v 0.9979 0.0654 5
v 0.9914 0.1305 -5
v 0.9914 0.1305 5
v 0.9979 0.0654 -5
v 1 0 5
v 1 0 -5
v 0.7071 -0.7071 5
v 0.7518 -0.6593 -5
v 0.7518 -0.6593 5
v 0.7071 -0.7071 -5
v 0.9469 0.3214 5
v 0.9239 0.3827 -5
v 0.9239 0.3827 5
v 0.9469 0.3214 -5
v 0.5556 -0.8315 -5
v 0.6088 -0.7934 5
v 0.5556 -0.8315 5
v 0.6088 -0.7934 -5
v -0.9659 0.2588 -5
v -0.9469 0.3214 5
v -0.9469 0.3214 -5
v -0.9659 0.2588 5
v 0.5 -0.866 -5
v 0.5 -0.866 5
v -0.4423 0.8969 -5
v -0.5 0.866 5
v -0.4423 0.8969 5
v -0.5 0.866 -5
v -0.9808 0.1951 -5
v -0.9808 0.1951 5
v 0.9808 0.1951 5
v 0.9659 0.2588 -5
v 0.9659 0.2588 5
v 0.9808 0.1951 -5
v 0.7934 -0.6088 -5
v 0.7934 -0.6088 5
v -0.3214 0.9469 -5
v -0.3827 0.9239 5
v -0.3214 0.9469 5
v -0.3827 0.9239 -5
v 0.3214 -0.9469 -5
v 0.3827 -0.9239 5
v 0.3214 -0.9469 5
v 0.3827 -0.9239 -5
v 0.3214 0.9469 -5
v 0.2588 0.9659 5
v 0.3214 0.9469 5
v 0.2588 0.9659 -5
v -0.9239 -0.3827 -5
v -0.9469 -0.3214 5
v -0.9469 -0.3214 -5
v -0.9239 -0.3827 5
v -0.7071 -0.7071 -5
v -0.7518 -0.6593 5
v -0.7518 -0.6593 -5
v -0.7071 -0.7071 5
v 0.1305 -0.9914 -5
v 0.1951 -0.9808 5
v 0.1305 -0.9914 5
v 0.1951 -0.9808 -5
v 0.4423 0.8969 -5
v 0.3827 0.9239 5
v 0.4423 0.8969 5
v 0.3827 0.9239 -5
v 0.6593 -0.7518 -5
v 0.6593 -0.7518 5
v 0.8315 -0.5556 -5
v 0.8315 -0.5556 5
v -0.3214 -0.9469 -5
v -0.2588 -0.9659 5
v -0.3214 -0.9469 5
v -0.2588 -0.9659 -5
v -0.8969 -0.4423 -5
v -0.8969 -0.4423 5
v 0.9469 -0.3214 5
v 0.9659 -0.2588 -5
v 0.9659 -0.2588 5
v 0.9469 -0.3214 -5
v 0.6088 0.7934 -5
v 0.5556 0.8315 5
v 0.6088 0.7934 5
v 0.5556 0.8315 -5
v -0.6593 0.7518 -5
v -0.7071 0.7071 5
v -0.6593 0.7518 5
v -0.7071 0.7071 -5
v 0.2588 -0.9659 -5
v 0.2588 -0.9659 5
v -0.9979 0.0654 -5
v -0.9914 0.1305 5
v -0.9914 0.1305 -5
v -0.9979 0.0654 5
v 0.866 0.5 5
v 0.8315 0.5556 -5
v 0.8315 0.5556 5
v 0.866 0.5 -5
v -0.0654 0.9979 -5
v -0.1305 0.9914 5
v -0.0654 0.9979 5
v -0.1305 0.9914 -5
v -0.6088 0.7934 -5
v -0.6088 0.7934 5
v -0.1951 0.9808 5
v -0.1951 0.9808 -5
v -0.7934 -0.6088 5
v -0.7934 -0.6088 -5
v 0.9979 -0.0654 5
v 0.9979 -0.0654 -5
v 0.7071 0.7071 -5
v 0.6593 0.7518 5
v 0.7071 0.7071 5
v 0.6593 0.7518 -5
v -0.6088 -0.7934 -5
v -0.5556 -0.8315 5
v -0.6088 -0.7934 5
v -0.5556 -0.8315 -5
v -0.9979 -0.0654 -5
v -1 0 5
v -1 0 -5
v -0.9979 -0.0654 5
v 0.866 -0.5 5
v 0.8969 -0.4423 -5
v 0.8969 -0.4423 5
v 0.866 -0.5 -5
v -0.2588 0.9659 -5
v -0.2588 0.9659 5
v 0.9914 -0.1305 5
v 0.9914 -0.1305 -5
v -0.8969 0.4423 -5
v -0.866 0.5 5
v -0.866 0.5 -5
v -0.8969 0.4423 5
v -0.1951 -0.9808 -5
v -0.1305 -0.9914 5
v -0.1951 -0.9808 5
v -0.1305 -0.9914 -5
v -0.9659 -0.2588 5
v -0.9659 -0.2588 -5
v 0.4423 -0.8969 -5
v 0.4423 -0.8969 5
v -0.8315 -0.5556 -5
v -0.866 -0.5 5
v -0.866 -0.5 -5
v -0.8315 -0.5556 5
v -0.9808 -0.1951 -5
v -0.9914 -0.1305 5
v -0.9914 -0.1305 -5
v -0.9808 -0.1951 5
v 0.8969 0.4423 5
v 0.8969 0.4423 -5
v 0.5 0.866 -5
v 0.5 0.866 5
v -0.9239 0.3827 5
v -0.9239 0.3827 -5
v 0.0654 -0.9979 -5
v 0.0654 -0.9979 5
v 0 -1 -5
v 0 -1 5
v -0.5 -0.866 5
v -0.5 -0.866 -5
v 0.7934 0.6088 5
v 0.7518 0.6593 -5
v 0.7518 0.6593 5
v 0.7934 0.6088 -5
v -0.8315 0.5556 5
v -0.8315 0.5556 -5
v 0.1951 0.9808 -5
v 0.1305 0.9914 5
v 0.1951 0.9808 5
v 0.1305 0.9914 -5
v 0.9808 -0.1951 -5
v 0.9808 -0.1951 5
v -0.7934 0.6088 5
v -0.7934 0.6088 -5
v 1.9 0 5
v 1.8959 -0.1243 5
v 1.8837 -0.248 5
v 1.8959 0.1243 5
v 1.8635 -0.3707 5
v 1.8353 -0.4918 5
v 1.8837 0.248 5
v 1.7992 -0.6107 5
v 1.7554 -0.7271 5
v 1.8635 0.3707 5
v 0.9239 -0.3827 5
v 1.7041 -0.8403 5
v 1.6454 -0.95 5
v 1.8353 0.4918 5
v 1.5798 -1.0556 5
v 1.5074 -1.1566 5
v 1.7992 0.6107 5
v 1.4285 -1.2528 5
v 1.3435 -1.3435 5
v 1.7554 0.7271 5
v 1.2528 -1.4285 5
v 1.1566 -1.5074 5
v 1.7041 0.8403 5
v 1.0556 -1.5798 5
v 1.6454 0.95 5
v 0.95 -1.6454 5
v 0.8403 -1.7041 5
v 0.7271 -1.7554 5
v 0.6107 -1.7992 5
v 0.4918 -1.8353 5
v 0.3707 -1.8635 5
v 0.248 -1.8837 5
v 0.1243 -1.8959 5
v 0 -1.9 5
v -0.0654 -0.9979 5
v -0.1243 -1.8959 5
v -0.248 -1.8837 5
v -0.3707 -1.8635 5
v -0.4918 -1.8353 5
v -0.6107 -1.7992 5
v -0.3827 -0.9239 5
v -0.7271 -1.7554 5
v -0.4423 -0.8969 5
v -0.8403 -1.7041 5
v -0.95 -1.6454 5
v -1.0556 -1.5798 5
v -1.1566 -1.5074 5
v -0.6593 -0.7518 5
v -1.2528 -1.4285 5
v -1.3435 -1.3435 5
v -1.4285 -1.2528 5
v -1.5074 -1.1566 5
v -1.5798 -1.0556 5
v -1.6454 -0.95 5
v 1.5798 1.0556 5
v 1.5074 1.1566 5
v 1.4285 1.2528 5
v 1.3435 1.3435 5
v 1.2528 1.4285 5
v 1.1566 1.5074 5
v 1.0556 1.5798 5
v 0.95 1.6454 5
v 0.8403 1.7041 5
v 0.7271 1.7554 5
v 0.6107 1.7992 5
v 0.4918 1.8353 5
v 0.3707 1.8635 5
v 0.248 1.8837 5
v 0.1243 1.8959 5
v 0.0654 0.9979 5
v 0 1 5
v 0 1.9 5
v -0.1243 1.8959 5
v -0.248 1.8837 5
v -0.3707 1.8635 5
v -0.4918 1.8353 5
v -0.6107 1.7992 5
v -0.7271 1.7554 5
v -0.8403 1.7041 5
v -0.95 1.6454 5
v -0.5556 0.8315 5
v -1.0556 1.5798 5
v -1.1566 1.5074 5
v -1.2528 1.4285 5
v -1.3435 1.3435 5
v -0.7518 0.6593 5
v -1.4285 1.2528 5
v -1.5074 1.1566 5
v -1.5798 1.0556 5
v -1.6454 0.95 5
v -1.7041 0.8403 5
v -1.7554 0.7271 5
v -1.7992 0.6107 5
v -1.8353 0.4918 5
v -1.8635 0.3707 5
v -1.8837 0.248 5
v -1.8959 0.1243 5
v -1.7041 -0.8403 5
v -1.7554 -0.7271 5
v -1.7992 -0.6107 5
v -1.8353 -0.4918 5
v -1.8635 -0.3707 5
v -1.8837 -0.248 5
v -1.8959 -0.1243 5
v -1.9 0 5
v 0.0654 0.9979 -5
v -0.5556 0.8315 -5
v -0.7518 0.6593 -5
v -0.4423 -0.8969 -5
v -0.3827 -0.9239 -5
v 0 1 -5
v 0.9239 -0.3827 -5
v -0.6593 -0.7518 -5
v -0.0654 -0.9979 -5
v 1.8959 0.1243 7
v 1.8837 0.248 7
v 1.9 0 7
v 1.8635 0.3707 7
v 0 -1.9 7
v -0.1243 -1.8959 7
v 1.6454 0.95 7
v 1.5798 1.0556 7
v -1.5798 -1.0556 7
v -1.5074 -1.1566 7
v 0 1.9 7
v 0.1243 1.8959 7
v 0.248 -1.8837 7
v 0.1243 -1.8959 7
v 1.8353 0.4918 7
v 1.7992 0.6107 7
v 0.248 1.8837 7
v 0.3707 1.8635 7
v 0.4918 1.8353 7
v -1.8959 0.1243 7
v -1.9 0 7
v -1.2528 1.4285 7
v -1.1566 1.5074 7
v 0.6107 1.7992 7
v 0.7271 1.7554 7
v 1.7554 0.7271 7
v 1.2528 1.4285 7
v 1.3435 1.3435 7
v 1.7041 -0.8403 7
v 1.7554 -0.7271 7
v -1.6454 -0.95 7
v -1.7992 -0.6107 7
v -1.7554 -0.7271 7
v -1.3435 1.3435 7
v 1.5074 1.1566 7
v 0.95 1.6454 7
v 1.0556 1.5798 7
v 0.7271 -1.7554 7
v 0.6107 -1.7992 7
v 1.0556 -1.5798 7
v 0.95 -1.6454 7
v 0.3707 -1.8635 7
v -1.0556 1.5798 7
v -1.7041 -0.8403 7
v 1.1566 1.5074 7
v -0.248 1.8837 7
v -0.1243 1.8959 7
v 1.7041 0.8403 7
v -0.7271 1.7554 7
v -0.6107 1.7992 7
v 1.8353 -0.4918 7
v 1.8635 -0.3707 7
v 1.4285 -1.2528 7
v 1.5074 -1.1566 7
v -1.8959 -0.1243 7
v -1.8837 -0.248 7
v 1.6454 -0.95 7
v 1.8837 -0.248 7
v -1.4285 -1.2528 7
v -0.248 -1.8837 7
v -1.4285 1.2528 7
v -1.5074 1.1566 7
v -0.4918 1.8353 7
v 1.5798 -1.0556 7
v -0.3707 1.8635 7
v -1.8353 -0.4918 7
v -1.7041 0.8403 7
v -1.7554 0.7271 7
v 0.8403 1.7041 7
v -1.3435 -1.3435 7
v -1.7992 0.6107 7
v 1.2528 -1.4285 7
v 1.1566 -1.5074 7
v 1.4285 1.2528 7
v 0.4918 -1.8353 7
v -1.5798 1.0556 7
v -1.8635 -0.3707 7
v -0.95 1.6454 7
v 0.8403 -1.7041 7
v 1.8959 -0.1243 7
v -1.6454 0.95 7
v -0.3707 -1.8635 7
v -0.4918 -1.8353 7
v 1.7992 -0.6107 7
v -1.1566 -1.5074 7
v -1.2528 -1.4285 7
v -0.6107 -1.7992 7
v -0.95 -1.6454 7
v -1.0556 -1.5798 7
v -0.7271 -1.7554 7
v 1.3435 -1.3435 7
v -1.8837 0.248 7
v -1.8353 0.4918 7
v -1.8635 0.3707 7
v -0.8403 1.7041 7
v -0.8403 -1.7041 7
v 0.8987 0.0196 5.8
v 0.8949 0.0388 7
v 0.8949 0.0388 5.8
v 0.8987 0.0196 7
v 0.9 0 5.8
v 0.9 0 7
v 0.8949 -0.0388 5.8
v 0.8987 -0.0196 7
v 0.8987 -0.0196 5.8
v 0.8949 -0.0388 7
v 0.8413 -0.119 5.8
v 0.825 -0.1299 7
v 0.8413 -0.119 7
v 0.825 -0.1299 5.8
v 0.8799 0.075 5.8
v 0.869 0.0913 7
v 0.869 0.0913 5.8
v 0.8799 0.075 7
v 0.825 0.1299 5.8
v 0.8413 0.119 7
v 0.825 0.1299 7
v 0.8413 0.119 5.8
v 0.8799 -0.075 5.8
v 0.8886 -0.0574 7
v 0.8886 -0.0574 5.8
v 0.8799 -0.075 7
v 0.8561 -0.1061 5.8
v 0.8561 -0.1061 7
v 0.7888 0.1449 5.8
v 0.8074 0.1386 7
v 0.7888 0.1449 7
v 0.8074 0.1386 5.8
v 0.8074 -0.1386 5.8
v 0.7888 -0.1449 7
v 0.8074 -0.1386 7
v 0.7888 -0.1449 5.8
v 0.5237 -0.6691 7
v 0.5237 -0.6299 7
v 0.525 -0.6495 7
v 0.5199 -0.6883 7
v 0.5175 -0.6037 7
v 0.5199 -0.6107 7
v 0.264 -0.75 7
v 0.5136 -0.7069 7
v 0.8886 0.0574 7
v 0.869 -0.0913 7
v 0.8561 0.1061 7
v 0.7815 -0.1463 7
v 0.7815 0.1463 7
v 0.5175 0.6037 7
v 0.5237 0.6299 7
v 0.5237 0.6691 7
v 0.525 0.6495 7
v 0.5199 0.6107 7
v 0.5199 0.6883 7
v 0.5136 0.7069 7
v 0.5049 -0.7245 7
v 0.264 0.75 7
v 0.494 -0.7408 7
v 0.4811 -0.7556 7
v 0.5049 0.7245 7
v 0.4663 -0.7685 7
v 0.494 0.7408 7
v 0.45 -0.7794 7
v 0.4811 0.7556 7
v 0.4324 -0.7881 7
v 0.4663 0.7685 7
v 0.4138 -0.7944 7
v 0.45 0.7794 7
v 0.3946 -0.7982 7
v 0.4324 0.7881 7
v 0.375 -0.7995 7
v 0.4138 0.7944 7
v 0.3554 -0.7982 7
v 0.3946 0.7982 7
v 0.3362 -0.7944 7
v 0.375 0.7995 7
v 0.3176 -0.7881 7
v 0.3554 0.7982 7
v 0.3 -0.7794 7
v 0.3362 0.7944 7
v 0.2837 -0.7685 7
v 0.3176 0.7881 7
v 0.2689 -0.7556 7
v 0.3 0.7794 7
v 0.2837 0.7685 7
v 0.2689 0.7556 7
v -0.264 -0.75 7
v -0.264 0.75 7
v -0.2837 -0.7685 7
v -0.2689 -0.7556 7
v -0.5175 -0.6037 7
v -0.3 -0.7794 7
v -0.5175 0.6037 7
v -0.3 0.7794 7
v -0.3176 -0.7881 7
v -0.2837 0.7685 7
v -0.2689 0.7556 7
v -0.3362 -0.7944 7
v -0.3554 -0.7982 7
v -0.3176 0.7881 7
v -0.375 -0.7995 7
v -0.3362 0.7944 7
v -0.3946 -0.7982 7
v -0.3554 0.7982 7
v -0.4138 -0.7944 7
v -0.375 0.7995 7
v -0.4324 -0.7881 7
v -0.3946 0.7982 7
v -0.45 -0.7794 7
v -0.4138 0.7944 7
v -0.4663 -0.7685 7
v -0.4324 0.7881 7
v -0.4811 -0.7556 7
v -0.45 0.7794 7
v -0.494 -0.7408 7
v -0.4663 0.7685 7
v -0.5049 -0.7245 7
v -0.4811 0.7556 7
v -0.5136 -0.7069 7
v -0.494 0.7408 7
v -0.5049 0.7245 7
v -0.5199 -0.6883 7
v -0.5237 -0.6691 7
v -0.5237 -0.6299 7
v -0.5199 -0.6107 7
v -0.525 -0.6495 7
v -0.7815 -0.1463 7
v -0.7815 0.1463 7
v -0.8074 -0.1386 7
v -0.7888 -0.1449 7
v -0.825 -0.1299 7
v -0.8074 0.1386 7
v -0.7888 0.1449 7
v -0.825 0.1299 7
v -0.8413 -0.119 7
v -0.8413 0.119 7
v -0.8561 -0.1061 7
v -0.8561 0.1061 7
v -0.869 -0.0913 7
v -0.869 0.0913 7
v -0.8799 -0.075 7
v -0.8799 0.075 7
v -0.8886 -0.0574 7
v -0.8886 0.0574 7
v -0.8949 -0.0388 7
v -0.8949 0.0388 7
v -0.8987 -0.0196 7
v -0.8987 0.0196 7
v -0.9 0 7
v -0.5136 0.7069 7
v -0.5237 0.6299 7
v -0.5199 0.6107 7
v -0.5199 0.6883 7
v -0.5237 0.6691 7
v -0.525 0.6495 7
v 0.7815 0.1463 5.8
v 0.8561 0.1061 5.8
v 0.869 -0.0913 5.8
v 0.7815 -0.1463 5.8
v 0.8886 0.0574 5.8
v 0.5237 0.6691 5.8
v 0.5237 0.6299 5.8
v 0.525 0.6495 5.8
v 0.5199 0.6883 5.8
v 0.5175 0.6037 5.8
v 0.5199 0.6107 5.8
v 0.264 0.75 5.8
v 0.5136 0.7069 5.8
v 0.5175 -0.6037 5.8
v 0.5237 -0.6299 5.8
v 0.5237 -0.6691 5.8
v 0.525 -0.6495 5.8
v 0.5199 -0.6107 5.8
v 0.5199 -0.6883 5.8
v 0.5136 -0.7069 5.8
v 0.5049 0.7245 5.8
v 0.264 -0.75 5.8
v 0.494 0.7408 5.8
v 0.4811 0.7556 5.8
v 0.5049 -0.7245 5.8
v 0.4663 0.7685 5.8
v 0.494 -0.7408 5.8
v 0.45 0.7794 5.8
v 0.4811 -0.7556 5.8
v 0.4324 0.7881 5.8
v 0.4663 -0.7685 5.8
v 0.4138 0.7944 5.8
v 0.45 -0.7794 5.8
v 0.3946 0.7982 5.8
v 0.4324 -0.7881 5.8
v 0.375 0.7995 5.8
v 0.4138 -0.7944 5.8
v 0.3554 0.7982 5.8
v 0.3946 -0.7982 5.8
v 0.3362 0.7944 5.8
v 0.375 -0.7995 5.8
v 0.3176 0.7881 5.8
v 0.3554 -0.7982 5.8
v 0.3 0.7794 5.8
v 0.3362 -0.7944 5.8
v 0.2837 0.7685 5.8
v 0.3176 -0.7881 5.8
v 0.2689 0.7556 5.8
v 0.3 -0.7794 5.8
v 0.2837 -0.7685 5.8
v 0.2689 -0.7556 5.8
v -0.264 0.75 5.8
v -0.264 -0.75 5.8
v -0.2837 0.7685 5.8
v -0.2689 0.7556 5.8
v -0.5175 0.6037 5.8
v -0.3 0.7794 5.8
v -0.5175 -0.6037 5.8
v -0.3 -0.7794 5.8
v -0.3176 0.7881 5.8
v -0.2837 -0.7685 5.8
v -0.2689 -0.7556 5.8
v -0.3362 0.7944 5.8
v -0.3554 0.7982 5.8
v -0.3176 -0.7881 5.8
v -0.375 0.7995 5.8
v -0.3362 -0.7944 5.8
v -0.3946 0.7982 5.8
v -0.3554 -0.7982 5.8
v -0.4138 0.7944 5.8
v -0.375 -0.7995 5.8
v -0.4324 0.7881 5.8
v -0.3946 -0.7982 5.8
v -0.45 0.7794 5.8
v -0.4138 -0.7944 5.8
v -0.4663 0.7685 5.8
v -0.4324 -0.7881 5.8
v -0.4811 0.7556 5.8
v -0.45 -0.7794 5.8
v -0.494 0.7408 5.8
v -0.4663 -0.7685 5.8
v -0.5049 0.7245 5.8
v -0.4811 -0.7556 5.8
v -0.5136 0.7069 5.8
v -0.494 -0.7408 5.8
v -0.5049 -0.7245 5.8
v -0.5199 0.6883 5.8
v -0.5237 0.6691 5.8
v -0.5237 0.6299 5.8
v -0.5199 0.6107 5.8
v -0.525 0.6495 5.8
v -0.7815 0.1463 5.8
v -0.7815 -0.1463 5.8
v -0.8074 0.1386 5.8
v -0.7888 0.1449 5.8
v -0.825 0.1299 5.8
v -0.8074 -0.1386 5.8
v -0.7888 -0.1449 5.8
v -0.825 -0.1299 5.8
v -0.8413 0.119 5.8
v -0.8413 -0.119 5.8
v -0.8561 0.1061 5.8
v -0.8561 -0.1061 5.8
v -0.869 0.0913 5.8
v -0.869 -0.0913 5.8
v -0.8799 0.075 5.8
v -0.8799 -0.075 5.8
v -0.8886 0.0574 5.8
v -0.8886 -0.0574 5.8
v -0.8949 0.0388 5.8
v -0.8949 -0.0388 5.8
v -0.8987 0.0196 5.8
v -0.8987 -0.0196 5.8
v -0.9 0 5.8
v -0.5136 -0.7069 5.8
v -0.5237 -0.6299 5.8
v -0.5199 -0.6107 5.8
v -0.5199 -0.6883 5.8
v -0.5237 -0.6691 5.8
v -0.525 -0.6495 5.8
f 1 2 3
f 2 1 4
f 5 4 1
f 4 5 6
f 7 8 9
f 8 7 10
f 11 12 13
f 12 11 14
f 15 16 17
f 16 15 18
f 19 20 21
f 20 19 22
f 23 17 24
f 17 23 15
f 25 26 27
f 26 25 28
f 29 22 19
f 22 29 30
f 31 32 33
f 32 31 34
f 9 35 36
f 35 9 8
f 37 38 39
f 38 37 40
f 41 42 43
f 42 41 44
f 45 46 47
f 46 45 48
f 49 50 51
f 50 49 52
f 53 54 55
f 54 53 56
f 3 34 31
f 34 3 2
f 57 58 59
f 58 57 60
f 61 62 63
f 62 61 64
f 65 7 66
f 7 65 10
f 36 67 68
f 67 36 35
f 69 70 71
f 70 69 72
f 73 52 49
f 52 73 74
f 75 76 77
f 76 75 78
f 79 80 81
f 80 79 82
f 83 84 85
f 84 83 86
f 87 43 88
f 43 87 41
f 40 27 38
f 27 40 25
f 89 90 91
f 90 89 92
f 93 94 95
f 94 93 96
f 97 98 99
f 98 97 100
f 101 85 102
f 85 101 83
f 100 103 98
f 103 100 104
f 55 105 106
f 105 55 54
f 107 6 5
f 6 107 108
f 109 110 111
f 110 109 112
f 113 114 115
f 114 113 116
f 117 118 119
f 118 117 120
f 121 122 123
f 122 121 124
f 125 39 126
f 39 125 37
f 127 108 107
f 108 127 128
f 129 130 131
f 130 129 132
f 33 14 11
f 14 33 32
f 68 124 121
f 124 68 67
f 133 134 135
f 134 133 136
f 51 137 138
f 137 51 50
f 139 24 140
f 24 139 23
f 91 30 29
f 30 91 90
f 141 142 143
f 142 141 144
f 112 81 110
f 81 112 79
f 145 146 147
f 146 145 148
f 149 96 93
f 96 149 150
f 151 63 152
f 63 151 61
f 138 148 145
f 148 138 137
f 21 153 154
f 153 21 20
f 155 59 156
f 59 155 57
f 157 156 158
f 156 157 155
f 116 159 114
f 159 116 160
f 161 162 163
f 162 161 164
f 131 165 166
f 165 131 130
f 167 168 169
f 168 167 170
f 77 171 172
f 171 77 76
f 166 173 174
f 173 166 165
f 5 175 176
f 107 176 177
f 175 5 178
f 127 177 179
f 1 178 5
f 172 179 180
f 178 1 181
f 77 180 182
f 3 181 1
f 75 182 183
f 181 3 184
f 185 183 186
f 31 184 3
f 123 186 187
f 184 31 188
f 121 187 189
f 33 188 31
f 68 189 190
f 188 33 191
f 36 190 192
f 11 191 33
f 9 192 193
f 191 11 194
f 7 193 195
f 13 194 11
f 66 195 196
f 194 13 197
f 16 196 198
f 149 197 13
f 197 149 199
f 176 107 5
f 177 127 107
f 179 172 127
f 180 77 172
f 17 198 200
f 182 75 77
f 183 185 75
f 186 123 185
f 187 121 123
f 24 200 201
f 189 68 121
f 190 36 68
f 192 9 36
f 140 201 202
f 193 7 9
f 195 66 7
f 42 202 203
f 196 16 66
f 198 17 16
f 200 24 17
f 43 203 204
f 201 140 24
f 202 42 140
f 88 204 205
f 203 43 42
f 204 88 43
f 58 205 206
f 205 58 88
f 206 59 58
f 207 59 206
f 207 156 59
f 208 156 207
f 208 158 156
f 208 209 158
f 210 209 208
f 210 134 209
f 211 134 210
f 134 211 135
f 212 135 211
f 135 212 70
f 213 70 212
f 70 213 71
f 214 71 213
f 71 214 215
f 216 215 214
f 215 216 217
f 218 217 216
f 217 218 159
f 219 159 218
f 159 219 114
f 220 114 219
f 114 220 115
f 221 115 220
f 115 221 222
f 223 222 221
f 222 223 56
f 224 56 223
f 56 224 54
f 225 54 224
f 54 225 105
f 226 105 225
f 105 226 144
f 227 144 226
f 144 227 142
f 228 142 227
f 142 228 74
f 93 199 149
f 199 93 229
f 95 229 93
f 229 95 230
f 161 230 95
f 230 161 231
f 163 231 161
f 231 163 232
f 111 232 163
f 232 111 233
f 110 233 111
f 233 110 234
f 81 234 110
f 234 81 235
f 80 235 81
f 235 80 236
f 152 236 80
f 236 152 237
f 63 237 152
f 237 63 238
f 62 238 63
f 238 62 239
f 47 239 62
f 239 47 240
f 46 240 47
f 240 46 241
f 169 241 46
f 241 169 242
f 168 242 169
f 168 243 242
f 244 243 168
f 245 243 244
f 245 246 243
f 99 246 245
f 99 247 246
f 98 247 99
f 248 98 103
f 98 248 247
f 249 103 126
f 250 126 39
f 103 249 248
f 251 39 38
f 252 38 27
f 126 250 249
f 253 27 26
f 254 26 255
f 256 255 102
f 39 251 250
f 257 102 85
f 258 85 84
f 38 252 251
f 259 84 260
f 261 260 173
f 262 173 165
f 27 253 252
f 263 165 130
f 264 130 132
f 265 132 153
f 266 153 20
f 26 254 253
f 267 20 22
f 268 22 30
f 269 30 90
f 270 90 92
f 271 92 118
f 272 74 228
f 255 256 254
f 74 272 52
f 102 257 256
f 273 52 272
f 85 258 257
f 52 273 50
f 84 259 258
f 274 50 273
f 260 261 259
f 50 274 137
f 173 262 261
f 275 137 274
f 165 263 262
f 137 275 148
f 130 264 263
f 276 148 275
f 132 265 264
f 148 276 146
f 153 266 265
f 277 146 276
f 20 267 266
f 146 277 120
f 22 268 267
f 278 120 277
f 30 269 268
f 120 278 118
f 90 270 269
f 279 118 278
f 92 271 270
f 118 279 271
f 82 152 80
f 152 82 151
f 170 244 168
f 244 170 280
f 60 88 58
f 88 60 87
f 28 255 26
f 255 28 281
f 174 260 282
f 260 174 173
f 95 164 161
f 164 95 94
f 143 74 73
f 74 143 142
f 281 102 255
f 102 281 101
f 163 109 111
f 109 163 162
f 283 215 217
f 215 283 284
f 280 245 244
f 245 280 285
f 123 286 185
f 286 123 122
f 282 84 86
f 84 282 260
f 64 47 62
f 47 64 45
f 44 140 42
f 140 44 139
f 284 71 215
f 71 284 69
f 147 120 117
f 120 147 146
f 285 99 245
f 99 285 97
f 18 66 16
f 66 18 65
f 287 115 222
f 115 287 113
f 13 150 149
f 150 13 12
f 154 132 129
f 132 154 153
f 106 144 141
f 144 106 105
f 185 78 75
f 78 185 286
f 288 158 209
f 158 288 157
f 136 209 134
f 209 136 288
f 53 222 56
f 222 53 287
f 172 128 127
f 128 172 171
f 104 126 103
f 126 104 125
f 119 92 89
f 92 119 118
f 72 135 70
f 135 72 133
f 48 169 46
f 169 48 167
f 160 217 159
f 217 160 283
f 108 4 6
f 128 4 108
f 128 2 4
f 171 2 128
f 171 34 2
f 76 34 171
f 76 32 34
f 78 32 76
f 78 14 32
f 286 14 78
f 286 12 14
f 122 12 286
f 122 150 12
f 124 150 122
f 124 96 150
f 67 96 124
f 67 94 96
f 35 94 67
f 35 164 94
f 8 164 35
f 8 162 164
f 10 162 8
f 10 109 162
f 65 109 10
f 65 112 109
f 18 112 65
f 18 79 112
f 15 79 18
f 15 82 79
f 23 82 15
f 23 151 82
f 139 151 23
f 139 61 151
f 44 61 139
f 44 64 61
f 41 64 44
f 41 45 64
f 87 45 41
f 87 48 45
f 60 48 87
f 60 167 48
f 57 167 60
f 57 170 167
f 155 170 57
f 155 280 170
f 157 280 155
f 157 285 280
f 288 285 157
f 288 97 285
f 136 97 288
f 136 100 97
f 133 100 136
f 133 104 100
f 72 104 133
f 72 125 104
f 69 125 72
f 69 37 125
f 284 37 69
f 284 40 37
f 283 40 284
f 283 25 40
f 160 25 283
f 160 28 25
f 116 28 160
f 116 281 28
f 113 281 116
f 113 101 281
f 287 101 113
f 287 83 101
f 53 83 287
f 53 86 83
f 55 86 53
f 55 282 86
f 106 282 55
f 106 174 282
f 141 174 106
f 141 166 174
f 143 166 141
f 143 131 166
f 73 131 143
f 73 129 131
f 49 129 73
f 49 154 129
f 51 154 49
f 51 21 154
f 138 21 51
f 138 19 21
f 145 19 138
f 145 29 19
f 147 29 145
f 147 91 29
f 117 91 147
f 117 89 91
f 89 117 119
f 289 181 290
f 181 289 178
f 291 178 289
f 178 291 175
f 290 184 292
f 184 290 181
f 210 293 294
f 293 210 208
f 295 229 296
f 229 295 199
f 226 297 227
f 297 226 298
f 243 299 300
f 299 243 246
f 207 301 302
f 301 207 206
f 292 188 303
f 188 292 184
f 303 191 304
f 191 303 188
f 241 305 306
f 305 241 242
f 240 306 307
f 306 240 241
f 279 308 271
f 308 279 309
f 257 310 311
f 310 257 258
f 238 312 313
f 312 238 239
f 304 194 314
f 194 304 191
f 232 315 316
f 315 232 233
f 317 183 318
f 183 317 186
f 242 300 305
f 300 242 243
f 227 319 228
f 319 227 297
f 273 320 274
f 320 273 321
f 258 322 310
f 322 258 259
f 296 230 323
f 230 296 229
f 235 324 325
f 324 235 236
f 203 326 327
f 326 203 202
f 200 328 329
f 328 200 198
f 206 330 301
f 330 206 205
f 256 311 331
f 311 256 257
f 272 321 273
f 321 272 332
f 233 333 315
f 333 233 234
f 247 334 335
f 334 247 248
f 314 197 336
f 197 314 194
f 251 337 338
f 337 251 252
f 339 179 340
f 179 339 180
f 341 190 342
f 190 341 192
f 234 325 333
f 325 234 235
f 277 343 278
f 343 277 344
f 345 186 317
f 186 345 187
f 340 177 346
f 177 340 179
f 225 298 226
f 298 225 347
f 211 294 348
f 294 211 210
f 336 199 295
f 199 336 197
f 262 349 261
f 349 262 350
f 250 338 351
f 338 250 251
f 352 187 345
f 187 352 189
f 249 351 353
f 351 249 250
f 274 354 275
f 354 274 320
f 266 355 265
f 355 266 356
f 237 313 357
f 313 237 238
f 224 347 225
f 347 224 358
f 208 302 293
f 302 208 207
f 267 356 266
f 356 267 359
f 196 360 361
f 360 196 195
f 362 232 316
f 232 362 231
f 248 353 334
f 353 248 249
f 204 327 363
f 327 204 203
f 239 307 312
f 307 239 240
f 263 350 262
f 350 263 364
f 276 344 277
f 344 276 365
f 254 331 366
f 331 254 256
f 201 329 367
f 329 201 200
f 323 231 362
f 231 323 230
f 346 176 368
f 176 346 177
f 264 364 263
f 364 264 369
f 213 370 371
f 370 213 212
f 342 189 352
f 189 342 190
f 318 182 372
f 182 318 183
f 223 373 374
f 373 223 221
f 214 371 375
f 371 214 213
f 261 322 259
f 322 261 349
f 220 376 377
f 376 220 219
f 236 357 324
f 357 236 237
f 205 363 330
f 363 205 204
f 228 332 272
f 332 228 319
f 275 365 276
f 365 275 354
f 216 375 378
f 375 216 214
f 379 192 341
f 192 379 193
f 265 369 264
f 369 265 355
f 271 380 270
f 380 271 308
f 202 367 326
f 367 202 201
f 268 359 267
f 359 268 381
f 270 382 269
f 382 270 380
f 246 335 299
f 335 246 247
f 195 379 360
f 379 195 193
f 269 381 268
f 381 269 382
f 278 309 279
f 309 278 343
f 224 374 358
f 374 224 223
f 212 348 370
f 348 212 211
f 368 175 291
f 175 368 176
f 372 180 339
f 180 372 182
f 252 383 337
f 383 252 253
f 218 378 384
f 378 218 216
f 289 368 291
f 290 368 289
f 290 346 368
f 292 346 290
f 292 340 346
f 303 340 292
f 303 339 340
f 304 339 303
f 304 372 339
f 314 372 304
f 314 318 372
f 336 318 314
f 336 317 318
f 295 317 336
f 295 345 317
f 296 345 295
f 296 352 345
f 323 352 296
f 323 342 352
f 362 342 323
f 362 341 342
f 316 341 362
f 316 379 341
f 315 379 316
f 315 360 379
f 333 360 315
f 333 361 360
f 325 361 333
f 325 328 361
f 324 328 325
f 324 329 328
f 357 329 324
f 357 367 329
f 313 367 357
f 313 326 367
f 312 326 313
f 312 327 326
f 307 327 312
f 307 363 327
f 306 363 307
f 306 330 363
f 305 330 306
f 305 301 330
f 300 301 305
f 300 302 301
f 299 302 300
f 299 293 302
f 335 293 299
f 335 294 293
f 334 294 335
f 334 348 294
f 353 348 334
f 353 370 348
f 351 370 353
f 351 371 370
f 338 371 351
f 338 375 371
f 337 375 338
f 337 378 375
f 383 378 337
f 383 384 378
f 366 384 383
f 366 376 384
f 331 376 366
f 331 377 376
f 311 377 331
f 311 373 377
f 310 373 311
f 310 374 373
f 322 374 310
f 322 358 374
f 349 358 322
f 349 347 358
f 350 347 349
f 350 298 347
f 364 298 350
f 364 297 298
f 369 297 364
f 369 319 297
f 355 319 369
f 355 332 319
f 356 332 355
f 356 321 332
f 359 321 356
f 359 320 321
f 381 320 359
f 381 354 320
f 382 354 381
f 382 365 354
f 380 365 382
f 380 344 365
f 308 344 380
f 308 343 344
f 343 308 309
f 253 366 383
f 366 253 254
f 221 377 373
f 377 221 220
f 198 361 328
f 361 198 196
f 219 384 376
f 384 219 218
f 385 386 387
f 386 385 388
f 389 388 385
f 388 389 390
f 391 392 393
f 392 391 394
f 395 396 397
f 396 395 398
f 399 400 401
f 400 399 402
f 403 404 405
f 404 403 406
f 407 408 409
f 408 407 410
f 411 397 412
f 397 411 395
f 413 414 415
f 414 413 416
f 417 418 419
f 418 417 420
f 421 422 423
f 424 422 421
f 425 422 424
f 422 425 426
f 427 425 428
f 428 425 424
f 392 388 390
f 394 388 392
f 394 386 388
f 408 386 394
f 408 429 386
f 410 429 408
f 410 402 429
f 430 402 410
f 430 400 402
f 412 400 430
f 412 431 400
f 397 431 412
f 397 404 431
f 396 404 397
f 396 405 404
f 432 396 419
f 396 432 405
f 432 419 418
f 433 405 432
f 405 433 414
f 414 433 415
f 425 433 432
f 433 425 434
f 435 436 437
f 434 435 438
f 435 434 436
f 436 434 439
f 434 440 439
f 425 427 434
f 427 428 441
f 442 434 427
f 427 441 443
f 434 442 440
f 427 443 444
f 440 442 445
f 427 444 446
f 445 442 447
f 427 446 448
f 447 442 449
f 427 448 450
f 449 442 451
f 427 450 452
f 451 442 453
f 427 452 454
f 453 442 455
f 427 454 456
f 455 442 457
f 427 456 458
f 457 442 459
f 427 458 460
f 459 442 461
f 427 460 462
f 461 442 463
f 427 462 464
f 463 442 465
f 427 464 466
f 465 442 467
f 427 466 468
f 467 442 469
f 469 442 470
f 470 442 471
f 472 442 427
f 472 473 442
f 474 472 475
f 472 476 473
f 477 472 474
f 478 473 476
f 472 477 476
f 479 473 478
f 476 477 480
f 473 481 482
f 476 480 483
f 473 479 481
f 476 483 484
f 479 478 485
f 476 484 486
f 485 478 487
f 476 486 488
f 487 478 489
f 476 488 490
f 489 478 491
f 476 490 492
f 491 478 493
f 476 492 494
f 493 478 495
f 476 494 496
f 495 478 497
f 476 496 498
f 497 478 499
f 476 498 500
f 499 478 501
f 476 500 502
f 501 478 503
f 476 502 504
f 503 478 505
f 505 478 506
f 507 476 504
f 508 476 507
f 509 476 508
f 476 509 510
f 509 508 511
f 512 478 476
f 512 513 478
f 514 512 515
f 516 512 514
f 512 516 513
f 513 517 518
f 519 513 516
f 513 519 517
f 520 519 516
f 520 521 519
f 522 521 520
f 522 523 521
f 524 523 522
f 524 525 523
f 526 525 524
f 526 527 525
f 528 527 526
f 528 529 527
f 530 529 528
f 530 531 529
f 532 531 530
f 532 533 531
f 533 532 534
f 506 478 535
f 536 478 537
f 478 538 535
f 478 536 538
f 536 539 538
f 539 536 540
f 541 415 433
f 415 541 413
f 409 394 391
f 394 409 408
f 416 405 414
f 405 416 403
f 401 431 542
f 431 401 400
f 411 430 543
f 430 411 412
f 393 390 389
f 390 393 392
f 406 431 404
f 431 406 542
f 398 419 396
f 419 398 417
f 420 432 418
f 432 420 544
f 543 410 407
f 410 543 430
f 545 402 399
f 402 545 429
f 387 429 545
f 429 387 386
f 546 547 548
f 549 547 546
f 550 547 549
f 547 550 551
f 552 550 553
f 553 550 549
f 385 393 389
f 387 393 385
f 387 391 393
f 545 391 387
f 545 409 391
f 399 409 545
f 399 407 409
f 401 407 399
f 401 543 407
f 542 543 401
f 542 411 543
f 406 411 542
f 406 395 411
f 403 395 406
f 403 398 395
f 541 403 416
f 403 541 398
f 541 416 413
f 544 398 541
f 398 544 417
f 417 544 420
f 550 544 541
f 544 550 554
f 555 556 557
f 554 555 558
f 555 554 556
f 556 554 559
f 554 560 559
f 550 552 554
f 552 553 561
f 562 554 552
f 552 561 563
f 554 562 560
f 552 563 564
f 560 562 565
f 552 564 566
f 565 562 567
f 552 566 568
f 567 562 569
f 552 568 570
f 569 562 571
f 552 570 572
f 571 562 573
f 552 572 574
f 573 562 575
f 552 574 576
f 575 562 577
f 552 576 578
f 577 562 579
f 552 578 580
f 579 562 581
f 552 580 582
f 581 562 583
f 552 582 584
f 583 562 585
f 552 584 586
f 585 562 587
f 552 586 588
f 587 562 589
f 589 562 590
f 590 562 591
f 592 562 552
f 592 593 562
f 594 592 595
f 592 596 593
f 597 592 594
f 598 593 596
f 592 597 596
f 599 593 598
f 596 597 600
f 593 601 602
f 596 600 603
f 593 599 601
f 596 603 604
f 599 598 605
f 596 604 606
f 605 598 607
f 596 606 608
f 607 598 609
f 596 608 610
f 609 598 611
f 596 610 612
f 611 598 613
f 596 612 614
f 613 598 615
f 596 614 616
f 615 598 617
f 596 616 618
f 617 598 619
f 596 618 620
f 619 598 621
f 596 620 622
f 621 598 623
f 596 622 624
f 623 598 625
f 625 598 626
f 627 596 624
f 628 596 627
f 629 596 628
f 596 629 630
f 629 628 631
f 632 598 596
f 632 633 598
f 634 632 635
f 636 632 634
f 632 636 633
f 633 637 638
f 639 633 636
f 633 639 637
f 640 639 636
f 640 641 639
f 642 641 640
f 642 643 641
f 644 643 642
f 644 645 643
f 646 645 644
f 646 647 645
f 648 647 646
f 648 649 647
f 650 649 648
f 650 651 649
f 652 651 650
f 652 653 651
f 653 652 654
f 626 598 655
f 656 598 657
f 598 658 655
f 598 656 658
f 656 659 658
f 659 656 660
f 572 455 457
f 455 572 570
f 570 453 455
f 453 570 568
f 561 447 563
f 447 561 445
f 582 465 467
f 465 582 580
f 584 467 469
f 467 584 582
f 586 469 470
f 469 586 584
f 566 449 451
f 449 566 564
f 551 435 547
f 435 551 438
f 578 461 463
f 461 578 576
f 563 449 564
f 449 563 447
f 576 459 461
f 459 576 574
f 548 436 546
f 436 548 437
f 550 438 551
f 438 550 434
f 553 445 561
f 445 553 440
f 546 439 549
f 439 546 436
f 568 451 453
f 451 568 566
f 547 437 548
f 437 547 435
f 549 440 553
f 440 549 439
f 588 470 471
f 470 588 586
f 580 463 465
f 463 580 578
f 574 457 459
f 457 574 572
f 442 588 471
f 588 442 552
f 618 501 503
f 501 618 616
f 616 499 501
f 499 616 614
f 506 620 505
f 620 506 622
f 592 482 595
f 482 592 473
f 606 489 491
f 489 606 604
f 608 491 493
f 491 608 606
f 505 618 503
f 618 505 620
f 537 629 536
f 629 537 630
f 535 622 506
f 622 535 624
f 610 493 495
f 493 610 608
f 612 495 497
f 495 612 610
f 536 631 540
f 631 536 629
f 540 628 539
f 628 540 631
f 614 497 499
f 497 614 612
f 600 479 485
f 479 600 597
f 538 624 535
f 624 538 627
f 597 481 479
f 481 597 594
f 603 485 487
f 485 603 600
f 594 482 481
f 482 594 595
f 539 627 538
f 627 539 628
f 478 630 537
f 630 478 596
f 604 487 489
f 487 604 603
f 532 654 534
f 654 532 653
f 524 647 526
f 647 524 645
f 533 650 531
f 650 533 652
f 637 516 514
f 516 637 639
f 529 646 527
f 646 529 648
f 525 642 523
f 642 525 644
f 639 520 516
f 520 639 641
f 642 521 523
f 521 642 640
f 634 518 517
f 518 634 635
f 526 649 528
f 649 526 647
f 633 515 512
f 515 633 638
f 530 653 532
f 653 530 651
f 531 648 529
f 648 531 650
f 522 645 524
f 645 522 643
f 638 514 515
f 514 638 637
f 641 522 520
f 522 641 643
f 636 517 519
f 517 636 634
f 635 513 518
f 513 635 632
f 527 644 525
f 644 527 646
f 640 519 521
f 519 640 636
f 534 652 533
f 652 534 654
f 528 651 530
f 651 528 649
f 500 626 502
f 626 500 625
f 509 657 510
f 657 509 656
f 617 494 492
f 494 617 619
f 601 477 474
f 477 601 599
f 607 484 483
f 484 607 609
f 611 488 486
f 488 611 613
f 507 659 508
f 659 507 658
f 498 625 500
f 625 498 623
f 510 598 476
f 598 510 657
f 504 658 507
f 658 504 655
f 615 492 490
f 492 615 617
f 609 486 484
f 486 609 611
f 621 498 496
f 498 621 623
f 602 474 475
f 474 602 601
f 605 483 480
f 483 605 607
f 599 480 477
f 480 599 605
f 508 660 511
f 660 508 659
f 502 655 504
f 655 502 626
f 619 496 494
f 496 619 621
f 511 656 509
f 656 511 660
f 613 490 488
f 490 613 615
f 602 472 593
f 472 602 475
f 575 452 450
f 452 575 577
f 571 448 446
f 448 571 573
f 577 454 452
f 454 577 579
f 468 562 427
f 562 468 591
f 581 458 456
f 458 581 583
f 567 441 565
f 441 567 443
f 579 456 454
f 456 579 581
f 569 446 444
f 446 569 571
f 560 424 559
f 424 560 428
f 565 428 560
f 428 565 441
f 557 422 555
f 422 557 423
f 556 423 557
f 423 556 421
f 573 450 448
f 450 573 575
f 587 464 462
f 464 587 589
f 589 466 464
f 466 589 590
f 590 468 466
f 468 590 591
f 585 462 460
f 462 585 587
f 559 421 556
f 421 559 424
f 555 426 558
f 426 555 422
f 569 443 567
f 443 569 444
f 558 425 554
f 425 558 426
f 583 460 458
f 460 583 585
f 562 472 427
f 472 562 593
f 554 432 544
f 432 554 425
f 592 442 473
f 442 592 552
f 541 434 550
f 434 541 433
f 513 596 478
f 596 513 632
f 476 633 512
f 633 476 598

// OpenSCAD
$fn=96;

module socket_head_cap_screw(d=2.0, L=10.0, head_d=3.8, head_h=2.0) {
    socket_af = 1.5;
    socket_depth = 1.2;
    socket_corner_r = 0.15;
    head_top_chamfer = 0.2;

    module hex_prism(af, h) {
        r = af / sqrt(3);
        cylinder(h=h, r=r, center=false, $fn=6);
    }

    module rounded_hex_socket(af, depth, corner_r) {
        union() {
            hex_prism(af, depth);
            for (a = [0:60:300]) {
                rotate([0,0,a]) translate([af/2,0,0]) cylinder(h=depth, r=corner_r, center=false, $fn=48);
            }
        }
    }

    difference() {
        union() {
            translate([0,0,-L/2]) cylinder(h=L, d=d, center=false, $fn=96);

            translate([0,0,L/2]) cylinder(h=head_h, d=head_d, center=false, $fn=96);

            translate([0,0,L/2 + head_h - head_top_chamfer])
                cylinder(h=head_top_chamfer, d1=head_d, d2=head_d - 2*head_top_chamfer, center=false, $fn=96);
        }

        translate([0,0,L/2 + head_h - socket_depth])
            rounded_hex_socket(socket_af, socket_depth, socket_corner_r);
    }
}

socket_head_cap_screw();
